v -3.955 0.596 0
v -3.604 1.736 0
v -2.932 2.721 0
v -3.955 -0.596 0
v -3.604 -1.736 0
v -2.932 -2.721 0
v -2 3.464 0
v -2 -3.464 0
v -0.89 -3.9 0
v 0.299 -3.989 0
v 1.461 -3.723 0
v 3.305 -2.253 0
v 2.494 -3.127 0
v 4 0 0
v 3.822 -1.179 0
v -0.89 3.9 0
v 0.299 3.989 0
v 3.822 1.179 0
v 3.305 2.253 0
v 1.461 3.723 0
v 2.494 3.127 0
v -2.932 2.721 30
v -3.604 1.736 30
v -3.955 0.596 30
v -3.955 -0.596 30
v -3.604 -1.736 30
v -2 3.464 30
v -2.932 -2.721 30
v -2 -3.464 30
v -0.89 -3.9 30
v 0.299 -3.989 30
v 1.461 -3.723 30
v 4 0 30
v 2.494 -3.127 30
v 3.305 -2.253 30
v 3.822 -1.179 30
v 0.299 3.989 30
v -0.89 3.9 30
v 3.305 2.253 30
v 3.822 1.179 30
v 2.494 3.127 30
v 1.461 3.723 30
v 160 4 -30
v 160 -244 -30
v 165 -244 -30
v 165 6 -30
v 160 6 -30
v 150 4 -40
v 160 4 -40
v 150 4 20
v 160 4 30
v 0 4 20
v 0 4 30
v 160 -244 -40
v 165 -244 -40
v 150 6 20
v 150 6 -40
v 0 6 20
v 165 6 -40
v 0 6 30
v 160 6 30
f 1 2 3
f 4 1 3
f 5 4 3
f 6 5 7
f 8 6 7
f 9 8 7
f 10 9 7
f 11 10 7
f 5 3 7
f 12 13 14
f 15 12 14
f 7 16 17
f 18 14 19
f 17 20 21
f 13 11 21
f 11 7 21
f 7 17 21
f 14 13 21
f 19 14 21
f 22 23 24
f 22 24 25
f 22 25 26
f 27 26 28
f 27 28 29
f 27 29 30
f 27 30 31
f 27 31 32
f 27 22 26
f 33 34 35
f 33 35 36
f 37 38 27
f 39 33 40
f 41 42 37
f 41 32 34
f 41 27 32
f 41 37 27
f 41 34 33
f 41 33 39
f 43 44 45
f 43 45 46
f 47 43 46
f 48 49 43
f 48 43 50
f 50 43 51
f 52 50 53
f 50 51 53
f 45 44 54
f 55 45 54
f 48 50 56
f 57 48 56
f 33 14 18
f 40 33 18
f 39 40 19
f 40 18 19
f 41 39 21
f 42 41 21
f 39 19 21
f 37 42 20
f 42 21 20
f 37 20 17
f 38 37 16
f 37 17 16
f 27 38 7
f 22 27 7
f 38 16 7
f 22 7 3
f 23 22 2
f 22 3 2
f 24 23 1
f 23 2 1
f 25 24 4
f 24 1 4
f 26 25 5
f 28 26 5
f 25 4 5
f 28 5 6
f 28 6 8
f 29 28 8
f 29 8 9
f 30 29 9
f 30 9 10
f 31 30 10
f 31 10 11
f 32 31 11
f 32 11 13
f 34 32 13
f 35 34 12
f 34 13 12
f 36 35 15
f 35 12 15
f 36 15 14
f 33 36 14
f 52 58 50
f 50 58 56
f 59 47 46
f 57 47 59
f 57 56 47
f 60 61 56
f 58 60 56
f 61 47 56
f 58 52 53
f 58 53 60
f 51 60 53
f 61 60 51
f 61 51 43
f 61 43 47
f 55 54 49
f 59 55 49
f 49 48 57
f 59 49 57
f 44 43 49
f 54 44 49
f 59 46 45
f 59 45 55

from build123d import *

# Parameters (mm, degrees)
SKETCH1_R           = 4
BOSS_EXTRUDE1_DEPTH = 30
SKETCH2_W           = 160
SKETCH2_H           = 2
BOSS_EXTRUDE2_DEPTH = 10
SKETCH3_W           = 10
SKETCH3_H           = 2
BOSS_EXTRUDE3_DEPTH = 60
SKETCH5_W           = 10
SKETCH5_H           = 250
BOSS_EXTRUDE5_DEPTH = 5


with BuildPart() as part:
    # Sketch1 → Boss-Extrude1 (new body)
    with BuildSketch(Plane.XY):
        Circle(SKETCH1_R)
    extrude(amount=BOSS_EXTRUDE1_DEPTH)


with BuildPart() as body_2:
    # Sketch2 → Boss-Extrude2 (new body)
    with BuildSketch(Plane.XY.offset(30)):
        with Locations((80, 5)):
            Rectangle(SKETCH2_W, SKETCH2_H)
    extrude(amount=-BOSS_EXTRUDE2_DEPTH)

    # Sketch3 → Boss-Extrude3 (add)
    with BuildSketch(Plane(origin=(0, 0, 20), x_dir=(-1, 0, 0), z_dir=(0, 0, -1))):
        with Locations((-155, 5)):
            Rectangle(SKETCH3_W, SKETCH3_H)
    extrude(amount=BOSS_EXTRUDE3_DEPTH)

    # Sketch5 → Boss-Extrude5 (add)
    with BuildSketch(Plane(origin=(160, 0, 0), x_dir=(0, 0, -1), z_dir=(1, 0, 0))):
        with Locations((35, -119)):
            Rectangle(SKETCH5_W, SKETCH5_H)
    extrude(amount=BOSS_EXTRUDE5_DEPTH)


solid = Compound([part.part, body_2.part])
